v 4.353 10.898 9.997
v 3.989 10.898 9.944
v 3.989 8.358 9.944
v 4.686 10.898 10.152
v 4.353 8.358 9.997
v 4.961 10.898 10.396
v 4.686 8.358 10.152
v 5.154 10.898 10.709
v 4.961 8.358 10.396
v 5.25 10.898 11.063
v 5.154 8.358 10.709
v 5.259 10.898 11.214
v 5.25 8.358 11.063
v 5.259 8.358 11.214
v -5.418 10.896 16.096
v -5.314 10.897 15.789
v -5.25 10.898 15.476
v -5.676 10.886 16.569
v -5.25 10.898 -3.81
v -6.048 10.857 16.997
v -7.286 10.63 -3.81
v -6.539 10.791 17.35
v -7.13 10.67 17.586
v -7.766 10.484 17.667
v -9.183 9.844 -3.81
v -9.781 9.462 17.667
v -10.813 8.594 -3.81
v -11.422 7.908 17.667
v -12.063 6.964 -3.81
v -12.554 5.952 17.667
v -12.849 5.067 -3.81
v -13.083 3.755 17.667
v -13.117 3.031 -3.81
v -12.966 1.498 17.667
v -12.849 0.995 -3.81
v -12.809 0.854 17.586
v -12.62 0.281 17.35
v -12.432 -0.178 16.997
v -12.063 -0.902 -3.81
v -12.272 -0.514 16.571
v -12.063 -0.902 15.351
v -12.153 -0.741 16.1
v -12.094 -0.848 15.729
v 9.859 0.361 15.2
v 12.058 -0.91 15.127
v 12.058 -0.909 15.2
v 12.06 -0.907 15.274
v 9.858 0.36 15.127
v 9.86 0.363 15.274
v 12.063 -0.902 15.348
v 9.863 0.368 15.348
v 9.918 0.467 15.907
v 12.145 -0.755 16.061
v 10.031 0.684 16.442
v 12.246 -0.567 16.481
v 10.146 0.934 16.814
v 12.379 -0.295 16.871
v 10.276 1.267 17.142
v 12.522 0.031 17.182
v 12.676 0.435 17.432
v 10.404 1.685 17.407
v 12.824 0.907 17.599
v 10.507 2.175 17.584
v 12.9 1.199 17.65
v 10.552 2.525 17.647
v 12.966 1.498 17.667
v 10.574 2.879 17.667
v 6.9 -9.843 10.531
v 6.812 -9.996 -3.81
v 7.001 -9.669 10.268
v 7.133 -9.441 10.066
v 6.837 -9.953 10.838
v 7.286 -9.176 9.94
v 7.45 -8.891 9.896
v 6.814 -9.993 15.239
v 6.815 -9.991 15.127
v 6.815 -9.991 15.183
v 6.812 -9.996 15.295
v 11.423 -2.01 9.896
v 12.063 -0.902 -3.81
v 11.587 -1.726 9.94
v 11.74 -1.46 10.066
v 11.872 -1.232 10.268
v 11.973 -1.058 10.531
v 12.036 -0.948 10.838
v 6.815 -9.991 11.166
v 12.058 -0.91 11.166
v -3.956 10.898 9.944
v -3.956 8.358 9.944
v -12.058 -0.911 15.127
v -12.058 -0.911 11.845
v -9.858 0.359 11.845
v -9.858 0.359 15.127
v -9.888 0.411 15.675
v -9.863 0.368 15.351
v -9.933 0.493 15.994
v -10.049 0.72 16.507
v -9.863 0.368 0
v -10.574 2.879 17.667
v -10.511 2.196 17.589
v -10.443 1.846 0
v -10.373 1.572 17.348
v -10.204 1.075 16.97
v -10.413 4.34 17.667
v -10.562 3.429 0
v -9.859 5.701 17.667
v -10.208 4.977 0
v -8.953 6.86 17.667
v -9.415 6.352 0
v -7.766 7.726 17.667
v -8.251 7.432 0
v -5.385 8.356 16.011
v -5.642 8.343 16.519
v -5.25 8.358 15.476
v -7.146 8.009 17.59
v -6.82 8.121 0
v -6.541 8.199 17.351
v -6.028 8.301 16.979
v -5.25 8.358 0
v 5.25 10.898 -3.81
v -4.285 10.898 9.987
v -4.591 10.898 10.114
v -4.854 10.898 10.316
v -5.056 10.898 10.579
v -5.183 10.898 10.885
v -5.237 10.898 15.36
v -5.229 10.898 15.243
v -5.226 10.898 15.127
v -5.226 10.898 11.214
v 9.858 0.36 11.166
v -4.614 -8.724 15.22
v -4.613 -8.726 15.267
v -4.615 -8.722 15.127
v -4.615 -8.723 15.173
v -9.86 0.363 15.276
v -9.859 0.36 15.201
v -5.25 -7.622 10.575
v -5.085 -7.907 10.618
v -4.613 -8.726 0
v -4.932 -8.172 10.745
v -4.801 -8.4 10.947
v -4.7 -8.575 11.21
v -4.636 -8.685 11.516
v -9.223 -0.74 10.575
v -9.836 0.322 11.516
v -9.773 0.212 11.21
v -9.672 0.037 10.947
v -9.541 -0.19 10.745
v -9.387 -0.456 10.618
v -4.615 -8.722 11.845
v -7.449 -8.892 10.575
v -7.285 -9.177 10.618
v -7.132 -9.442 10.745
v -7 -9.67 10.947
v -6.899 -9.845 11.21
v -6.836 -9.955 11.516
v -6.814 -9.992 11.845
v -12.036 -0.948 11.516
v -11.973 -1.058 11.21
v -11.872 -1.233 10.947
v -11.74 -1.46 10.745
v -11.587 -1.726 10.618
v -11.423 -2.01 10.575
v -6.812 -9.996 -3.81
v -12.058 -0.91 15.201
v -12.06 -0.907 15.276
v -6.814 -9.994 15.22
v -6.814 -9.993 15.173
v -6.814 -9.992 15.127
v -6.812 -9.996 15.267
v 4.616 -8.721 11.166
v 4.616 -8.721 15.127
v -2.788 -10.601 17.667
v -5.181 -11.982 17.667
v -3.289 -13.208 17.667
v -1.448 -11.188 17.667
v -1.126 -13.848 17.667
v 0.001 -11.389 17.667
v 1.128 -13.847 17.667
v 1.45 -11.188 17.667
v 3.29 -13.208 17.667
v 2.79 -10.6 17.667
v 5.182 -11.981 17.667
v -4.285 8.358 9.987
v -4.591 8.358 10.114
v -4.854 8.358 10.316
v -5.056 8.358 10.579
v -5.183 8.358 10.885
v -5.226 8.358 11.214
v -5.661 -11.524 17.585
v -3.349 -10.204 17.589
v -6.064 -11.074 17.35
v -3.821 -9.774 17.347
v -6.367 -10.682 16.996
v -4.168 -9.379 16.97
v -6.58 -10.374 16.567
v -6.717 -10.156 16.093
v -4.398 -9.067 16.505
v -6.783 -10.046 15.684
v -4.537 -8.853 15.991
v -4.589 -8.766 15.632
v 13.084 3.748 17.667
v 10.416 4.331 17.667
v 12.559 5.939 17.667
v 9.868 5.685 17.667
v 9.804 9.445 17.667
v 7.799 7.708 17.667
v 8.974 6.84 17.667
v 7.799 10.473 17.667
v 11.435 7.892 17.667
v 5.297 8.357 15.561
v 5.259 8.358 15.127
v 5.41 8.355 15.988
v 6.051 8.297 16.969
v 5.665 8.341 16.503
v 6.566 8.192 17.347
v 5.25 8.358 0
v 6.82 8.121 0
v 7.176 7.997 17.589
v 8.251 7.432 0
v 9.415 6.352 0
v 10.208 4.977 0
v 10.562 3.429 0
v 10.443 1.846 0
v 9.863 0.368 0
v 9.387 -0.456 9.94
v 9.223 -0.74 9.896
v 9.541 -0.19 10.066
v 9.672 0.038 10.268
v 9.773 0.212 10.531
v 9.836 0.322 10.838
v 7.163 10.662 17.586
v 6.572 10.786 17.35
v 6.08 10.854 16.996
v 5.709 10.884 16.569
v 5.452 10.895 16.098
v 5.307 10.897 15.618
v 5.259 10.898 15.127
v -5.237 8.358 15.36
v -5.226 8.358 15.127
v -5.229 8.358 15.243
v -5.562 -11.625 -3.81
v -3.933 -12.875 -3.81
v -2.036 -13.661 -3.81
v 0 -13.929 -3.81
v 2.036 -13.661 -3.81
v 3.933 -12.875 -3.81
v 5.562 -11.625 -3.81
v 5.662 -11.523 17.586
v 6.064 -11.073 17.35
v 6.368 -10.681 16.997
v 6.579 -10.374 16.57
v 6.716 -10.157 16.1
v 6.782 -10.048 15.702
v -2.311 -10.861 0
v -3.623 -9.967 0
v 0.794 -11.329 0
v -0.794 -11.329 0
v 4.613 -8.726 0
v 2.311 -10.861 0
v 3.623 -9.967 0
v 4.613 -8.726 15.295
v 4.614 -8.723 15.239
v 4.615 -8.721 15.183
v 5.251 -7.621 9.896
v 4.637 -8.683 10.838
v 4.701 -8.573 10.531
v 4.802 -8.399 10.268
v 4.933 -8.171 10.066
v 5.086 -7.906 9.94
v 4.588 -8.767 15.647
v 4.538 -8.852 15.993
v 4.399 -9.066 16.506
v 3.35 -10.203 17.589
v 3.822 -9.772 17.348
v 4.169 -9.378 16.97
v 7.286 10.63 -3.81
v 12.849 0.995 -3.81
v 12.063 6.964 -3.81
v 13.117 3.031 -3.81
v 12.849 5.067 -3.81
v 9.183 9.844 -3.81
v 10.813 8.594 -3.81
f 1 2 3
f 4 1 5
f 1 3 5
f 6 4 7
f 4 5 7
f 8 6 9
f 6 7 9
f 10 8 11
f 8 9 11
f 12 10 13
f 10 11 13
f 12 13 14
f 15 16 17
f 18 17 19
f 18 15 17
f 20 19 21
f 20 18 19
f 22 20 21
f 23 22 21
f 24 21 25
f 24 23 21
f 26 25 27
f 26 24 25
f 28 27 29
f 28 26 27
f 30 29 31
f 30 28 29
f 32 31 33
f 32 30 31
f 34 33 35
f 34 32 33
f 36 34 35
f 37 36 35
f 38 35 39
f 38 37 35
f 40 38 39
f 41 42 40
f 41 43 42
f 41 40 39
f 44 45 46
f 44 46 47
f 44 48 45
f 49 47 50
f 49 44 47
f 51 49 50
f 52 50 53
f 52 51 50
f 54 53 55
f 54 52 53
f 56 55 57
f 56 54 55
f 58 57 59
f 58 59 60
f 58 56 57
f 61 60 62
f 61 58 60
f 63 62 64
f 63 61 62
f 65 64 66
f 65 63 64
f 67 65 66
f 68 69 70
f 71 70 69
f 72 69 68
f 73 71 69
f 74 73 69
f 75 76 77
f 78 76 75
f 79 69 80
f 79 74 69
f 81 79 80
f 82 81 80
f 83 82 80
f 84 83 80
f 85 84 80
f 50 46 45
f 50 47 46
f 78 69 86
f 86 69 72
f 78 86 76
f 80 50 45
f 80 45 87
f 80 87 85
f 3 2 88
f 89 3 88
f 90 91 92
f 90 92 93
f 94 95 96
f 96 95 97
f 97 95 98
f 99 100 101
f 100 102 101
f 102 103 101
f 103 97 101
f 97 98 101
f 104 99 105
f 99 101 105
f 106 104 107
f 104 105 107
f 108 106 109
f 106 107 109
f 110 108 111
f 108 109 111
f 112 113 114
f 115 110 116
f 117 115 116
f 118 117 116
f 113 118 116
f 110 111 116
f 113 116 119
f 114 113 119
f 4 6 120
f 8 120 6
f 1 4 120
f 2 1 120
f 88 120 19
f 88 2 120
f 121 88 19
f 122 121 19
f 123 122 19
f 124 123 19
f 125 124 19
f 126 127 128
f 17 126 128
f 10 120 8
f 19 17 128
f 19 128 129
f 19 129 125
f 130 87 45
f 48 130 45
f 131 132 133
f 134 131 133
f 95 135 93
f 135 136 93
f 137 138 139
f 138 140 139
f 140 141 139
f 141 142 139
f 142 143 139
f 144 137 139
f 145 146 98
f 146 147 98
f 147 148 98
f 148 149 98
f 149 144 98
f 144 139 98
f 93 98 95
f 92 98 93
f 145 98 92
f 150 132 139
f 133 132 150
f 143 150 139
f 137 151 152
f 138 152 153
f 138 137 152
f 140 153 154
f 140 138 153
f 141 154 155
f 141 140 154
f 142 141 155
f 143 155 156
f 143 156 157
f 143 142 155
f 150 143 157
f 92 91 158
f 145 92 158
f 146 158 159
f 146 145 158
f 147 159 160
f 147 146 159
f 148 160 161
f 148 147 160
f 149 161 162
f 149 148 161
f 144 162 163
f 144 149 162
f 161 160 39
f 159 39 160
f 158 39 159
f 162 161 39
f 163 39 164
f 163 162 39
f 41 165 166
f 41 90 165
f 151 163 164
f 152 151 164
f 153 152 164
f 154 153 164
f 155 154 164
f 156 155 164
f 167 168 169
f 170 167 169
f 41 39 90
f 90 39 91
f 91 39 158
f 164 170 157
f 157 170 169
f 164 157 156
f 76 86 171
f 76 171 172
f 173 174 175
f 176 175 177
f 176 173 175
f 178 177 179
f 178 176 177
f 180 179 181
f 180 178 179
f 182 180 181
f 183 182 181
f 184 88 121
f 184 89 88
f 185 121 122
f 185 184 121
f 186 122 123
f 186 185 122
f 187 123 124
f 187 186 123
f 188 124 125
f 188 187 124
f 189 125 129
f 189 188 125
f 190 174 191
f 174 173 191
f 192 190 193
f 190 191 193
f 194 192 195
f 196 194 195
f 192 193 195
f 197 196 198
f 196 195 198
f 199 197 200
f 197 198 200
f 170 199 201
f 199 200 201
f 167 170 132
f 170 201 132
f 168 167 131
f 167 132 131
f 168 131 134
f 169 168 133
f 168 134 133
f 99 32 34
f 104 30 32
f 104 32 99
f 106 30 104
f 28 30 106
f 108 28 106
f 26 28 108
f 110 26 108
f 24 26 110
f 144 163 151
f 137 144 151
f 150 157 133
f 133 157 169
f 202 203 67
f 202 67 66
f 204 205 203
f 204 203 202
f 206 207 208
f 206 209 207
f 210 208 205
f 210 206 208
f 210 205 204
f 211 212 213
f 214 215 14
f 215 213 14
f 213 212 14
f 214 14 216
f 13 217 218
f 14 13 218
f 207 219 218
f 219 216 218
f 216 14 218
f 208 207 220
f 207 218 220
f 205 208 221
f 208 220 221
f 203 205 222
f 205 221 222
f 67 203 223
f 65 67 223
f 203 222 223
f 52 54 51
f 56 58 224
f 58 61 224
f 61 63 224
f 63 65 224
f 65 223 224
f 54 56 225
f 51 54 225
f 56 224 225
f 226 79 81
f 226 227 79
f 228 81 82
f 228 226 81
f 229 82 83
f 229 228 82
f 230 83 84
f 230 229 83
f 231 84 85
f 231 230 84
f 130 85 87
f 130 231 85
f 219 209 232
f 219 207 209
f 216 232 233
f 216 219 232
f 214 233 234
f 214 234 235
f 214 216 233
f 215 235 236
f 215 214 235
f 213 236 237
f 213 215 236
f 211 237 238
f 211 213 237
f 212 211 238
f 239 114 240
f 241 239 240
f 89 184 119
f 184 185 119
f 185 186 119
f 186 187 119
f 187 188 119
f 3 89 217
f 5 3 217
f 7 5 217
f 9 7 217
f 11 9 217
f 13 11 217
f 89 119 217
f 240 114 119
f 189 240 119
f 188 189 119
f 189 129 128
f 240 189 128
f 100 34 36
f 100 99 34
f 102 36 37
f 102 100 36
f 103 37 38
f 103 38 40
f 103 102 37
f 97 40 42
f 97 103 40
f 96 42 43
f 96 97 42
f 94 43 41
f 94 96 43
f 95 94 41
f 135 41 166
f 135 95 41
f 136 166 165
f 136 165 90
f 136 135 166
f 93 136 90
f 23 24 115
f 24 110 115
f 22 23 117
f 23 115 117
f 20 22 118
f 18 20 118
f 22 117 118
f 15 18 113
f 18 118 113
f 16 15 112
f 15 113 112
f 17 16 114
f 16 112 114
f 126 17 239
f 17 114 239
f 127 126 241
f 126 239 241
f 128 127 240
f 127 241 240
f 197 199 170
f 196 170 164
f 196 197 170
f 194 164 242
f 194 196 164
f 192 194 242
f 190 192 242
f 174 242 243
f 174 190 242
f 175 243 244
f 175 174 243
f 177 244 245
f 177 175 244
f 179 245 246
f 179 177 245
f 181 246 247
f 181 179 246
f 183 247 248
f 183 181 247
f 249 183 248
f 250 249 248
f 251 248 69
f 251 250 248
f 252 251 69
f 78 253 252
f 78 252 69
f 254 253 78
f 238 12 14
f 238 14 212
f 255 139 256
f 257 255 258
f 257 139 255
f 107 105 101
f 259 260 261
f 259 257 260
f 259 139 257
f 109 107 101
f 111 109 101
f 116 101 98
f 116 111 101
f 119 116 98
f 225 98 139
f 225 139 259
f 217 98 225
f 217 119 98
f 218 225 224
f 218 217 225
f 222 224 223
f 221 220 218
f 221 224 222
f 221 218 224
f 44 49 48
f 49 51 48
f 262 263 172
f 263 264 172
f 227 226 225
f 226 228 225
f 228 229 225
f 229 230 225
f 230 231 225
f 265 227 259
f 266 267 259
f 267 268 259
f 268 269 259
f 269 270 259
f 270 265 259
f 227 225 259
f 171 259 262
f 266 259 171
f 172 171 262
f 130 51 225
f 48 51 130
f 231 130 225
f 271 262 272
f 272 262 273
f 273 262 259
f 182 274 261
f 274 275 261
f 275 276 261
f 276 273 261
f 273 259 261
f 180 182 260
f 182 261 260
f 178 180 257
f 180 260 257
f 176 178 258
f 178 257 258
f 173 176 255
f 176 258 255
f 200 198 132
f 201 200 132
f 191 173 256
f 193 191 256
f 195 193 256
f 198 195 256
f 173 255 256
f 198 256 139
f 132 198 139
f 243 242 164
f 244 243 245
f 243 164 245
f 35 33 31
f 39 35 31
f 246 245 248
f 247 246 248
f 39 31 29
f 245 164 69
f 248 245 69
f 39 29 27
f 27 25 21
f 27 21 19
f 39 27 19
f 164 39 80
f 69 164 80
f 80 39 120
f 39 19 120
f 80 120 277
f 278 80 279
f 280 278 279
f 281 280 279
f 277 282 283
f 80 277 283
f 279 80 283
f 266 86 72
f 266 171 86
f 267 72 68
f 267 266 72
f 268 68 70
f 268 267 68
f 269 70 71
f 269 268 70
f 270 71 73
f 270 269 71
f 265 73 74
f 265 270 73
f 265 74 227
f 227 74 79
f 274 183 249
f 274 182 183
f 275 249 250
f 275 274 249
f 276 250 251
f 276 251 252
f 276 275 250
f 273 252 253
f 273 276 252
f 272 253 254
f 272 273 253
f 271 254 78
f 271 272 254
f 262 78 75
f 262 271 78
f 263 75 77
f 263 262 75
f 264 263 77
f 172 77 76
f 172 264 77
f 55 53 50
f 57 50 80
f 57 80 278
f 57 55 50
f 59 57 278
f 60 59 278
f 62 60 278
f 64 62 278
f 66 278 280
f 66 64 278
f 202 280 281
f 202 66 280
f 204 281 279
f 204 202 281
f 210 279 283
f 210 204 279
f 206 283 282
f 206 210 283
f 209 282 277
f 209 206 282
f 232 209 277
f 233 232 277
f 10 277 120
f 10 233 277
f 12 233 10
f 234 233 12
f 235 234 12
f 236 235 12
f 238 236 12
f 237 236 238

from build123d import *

# Parameters (mm, degrees)
F2_DEPTH  = 17.6665466667
F3_DEPTH  = 3.81
F5_W      = 10.4865888134
F5_H      = 7.7739614062
F6_DEPTH  = 30.1752
F8_W      = 10.48512
F8_H      = 7.7724
F9_DEPTH  = 32.004
F11_W     = 10.48512
F11_H     = 7.7724
F12_DEPTH = 31.6738
F13_R     = 2.54
F14_R     = 1.27


with BuildPart() as f2:
    # F1 (on Top) → F2 (new body)
    with BuildSketch(Plane.XY):
        with BuildLine():
            Line((6.8124849158, -9.9955756726), (12.0626649158, -0.9019971637))
            ThreePointArc((12.0626649158, -0.9019971637), (12.0626649158, 6.9643828363), (5.25018, 10.8975728363))
            Line((5.25018, 10.8975728363), (-5.25018, 10.8975728363))
            ThreePointArc((-5.25018, 10.8975728363), (-12.0626649158, 6.9643828363), (-12.0626649158, -0.9019971637))
            Line((-12.0626649158, -0.9019971637), (-6.8124849158, -9.9955756726))
            ThreePointArc((-6.8124849158, -9.9955756726), (0, -13.9287656726), (6.8124849158, -9.9955756726))
        make_face()
        with BuildLine():
            ThreePointArc((-9.8629603902, 0.3680028363), (-9.8629603902, 5.6943828363), (-5.25018, 8.3575728363))
            Line((-5.25018, 8.3575728363), (5.25018, 8.3575728363))
            ThreePointArc((5.25018, 8.3575728363), (9.8629603902, 5.6943828363), (9.8629603902, 0.3680028363))
            Line((9.8629603902, 0.3680028363), (4.6127803902, -8.7255756726))
            ThreePointArc((4.6127803902, -8.7255756726), (0, -11.3887656726), (-4.6127803902, -8.7255756726))
            Line((-4.6127803902, -8.7255756726), (-9.8629603902, 0.3680028363))
        make_face(mode=Mode.SUBTRACT)
    extrude(amount=F2_DEPTH)

    # F1 (on Top) → F3 (join)
    with BuildSketch(Plane.XY):
        with BuildLine():
            Line((6.8124849158, -9.9955756726), (12.0626649158, -0.9019971637))
            ThreePointArc((12.0626649158, -0.9019971637), (12.0626649158, 6.9643828363), (5.25018, 10.8975728363))
            Line((5.25018, 10.8975728363), (-5.25018, 10.8975728363))
            ThreePointArc((-5.25018, 10.8975728363), (-12.0626649158, 6.9643828363), (-12.0626649158, -0.9019971637))
            Line((-12.0626649158, -0.9019971637), (-6.8124849158, -9.9955756726))
            ThreePointArc((-6.8124849158, -9.9955756726), (0, -13.9287656726), (6.8124849158, -9.9955756726))
        make_face()
        with BuildLine():
            ThreePointArc((-9.8629603902, 0.3680028363), (-9.8629603902, 5.6943828363), (-5.25018, 8.3575728363))
            Line((-5.25018, 8.3575728363), (5.25018, 8.3575728363))
            ThreePointArc((5.25018, 8.3575728363), (9.8629603902, 5.6943828363), (9.8629603902, 0.3680028363))
            Line((9.8629603902, 0.3680028363), (4.6127803902, -8.7255756726))
            ThreePointArc((4.6127803902, -8.7255756726), (0, -11.3887656726), (-4.6127803902, -8.7255756726))
            Line((-4.6127803902, -8.7255756726), (-9.8629603902, 0.3680028363))
        make_face(mode=Mode.SUBTRACT)
        with BuildLine():
            Line((5.25018, 8.3575728363), (-5.25018, 8.3575728363))
            ThreePointArc((-5.25018, 8.3575728363), (-9.8629603902, 5.6943828363), (-9.8629603902, 0.3680028363))
            Line((-9.8629603902, 0.3680028363), (-4.6127803902, -8.7255756726))
            ThreePointArc((-4.6127803902, -8.7255756726), (0, -11.3887656726), (4.6127803902, -8.7255756726))
            Line((4.6127803902, -8.7255756726), (9.8629603902, 0.3680028363))
            ThreePointArc((9.8629603902, 0.3680028363), (9.8629603902, 5.6943828363), (5.25018, 8.3575728363))
        make_face()
    extrude(amount=-F3_DEPTH)

    # F5 (on offset) → F6 (cut)
    with BuildSketch(Plane(origin=(-31.4346201719, -18.1487864181, 0), x_dir=(0.5, -0.8660254038, 0), z_dir=(-0.8660254038, -0.5, 0))):
        with Locations((0.0030086376, 14.4617783371)):
            Rectangle(F5_W, F5_H)
    extrude(amount=-F6_DEPTH, mode=Mode.SUBTRACT)

    # F8 (on offset) → F9 (cut)
    with BuildSketch(Plane(origin=(0, 36.2975728363, 0), x_dir=(-1, 0, 0), z_dir=(0, 1, 0))):
        with Locations((-0.0165903475, 13.8303037011)):
            Rectangle(F8_W, F8_H)
    extrude(amount=-F9_DEPTH, mode=Mode.SUBTRACT)

    # F11 (on offset) → F12 (cut)
    with BuildSketch(Plane(origin=(31.4346201719, -18.1487864181, 0), x_dir=(0.5, 0.8660254038, 0), z_dir=(0.8660254038, -0.5, 0))):
        with Locations((-0.0020326115, 13.782461328)):
            Rectangle(F11_W, F11_H)
    extrude(amount=-F12_DEPTH, mode=Mode.SUBTRACT)

    # F13
    f13_edges = [f2.edges().sort_by_distance(p)[0] for p in [
        (5.25915, 9.627567, 17.666547),
        (-5.22597, 9.627573, 17.666547),
        (5.715426, -9.355737, 17.666547),
        (10.957986, -0.275357, 17.666547),
        (-5.714571, -9.357218, 17.666547),
        (-10.957866, -0.275566, 17.666547),
    ]]
    fillet(f13_edges, radius=F13_R)

    # F14
    f14_edges = [f2.edges().sort_by_distance(p)[0] for p in [
        (-5.714571, -9.357218, 10.574798),
        (5.25915, 9.627567, 9.944104),
        (-5.22597, 9.627573, 9.944104),
        (5.715426, -9.355737, 9.896261),
        (10.957986, -0.275357, 9.896261),
        (-10.957866, -0.275566, 10.574798),
    ]]
    fillet(f14_edges, radius=F14_R)


solid = f2.part
